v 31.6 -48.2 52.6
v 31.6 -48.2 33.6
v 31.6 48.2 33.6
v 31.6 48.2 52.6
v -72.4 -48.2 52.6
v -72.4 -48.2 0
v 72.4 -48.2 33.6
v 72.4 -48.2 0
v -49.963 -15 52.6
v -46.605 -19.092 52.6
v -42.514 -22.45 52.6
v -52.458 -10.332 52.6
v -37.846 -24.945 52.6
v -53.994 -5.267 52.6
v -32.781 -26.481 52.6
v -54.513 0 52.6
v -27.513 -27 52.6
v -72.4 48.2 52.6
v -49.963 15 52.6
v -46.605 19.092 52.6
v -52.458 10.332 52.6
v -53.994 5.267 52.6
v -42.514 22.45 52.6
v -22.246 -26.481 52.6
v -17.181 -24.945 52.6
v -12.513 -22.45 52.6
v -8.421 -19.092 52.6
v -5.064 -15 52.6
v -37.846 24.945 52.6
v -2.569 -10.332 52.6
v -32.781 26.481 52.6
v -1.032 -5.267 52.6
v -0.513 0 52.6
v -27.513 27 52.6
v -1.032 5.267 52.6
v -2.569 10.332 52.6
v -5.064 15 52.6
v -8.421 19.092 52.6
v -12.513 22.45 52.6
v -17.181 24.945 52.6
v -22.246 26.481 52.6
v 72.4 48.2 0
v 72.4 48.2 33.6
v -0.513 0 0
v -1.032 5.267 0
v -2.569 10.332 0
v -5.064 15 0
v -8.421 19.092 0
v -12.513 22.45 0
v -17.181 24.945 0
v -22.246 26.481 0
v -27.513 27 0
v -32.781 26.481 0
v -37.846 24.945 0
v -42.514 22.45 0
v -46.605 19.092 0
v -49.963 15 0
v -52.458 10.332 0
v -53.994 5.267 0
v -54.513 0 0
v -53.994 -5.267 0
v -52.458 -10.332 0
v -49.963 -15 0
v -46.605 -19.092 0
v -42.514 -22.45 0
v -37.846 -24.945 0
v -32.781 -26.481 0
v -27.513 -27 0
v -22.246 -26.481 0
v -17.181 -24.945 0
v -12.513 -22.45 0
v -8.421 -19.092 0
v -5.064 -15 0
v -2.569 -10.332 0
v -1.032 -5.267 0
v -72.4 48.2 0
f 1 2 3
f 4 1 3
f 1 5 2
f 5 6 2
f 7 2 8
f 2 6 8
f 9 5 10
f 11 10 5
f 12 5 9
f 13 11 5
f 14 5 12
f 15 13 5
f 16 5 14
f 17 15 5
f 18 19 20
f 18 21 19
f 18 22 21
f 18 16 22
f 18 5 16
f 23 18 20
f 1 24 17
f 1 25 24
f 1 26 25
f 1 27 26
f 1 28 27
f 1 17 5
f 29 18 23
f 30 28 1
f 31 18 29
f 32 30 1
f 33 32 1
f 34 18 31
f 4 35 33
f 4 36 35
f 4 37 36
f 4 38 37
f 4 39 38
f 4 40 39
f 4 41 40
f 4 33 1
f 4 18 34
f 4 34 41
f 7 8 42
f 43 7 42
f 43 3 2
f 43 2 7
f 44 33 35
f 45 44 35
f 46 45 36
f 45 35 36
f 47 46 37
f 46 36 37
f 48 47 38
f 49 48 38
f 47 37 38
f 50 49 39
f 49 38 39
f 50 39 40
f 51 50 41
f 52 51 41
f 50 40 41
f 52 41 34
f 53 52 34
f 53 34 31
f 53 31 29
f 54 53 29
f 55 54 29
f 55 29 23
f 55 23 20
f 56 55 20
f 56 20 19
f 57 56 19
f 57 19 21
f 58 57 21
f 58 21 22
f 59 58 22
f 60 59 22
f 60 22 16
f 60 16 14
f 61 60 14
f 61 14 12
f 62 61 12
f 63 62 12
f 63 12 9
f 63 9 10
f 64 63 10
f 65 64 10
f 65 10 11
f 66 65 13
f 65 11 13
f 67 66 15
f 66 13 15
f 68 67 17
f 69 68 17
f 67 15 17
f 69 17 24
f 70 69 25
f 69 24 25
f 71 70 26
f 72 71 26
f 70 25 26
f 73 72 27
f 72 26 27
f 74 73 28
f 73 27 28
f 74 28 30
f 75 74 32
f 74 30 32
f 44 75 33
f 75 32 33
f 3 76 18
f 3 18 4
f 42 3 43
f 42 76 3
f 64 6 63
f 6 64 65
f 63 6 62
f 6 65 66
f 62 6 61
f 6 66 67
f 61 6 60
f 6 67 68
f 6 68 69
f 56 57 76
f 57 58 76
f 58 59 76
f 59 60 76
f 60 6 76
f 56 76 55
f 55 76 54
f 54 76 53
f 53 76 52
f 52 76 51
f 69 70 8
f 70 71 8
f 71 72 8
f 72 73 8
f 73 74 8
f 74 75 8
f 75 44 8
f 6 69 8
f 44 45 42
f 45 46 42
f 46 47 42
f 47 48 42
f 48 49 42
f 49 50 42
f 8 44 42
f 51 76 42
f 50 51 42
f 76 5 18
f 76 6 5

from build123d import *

# Parameters (mm, degrees)
F0_W     = 144.8
F0_H     = 96.4
F1_DEPTH = 33.6
F2_W     = 104
F2_H     = 96.4
F3_DEPTH = 19
F4_R     = 27
F5_DEPTH = 159


with BuildPart() as f1:
    # F0 (on Top) → F1 (new body)
    with BuildSketch(Plane.XY):
        Rectangle(F0_W, F0_H)
    extrude(amount=F1_DEPTH)

    # F2 (on face) → F3 (join)
    with BuildSketch(Plane.XY.offset(33.6)):
        with Locations((-20.4, 0)):
            Rectangle(F2_W, F2_H)
    extrude(amount=F3_DEPTH)

    # F4 (on face) → F5 (cut)
    with BuildSketch(Plane.XY.offset(52.6)):
        with Locations((-27.513253, 0)):
            Circle(F4_R)
    extrude(amount=-F5_DEPTH, mode=Mode.SUBTRACT)


solid = f1.part
